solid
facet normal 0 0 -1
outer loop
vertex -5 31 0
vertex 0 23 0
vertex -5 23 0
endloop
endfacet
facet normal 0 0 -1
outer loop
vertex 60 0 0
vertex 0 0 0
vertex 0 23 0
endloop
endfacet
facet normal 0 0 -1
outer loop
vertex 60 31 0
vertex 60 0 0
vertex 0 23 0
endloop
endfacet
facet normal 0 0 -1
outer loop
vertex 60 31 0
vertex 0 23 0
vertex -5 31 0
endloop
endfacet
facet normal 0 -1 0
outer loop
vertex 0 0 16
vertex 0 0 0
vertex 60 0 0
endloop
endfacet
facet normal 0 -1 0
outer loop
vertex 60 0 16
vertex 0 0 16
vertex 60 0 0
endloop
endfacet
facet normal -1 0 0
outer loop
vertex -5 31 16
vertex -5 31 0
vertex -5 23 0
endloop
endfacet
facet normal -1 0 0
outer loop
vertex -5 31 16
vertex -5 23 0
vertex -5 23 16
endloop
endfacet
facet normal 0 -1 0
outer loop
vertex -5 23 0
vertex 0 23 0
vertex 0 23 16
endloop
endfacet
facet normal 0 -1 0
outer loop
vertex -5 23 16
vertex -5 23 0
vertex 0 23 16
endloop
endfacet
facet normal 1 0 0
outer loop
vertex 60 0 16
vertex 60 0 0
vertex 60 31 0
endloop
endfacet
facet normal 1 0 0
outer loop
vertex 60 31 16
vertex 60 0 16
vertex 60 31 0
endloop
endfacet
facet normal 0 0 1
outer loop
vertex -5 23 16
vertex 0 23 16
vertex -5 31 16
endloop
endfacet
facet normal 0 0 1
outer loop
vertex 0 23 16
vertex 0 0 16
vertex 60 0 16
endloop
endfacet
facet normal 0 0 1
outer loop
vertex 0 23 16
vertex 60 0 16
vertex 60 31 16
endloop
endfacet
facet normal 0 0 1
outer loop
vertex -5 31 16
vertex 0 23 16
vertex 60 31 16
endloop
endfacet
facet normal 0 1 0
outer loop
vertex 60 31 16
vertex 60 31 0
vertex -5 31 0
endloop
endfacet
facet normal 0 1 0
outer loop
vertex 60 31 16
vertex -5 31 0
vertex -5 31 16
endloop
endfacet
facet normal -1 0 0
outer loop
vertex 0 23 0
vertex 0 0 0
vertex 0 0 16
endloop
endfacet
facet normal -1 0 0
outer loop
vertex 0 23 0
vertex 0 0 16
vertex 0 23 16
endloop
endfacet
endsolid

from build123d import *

# Parameters (mm, degrees)
SKETCH1_W           = 60
SKETCH1_H           = 31
BOSS_EXTRUDE1_DEPTH = 16
SKETCH2_W           = 16
SKETCH2_H           = 8
BOSS_EXTRUDE2_DEPTH = 5


with BuildPart() as part:
    # Sketch1 → Boss-Extrude1 (new body)
    with BuildSketch(Plane.XY):
        with Locations((30, 15.5)):
            Rectangle(SKETCH1_W, SKETCH1_H)
    extrude(amount=BOSS_EXTRUDE1_DEPTH)

    # Sketch2 → Boss-Extrude2 (add)
    with BuildSketch(Plane.ZY):
        with Locations((8, 27)):
            Rectangle(SKETCH2_W, SKETCH2_H)
    extrude(amount=BOSS_EXTRUDE2_DEPTH)


solid = part.part
